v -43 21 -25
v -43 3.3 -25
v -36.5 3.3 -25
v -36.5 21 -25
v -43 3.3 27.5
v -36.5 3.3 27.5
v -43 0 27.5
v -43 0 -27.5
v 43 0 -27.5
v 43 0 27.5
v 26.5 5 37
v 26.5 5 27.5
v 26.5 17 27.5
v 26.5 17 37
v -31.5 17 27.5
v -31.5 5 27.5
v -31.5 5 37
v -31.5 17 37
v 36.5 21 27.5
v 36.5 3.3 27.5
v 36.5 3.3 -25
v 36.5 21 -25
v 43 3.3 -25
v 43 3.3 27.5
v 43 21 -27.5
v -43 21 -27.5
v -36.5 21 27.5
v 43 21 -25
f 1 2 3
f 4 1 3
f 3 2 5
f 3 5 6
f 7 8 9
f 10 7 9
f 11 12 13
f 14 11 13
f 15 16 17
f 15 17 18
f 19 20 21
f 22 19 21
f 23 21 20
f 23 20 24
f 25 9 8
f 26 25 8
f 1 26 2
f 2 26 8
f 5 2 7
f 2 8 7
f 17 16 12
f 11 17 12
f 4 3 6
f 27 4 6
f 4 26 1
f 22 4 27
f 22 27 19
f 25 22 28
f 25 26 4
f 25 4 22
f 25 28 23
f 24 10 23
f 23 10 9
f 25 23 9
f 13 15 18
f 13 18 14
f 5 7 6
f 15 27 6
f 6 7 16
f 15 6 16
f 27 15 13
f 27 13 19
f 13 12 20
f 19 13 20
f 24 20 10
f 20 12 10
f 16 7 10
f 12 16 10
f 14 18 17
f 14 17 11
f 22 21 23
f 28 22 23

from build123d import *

# Parameters (mm, degrees)
SKETCH1_W           = 86
SKETCH1_H           = 55
BOSS_EXTRUDE1_DEPTH = 3.3
BOSS_EXTRUDE2_DEPTH = 17.7
SKETCH3_W           = 58
SKETCH3_H           = 12
BOSS_EXTRUDE3_DEPTH = 9.5


with BuildPart() as part:
    # Sketch1 → Boss-Extrude1 (new body)
    with BuildSketch(Plane(origin=(0, 0, 0), x_dir=(1, 0, 0), z_dir=(0, 1, 0))):
        Rectangle(SKETCH1_W, SKETCH1_H)
    extrude(amount=BOSS_EXTRUDE1_DEPTH)

    # Sketch2 → Boss-Extrude2 (add)
    with BuildSketch(Plane(origin=(0, 3.3, 0), x_dir=(1, 0, 0), z_dir=(0, 1, 0))):
        Polygon((43, 27.5), (-43, 27.5), (-43, 25), (-36.5, 25), (-36.5, -27.5), (36.5, -27.5), (36.5, 25), (43, 25), align=None)
    extrude(amount=BOSS_EXTRUDE2_DEPTH)

    # Sketch3 → Boss-Extrude3 (add)
    with BuildSketch(Plane.XY.offset(27.5)):
        with Locations((-2.5, 11)):
            Rectangle(SKETCH3_W, SKETCH3_H)
    extrude(amount=BOSS_EXTRUDE3_DEPTH)


solid = part.part
